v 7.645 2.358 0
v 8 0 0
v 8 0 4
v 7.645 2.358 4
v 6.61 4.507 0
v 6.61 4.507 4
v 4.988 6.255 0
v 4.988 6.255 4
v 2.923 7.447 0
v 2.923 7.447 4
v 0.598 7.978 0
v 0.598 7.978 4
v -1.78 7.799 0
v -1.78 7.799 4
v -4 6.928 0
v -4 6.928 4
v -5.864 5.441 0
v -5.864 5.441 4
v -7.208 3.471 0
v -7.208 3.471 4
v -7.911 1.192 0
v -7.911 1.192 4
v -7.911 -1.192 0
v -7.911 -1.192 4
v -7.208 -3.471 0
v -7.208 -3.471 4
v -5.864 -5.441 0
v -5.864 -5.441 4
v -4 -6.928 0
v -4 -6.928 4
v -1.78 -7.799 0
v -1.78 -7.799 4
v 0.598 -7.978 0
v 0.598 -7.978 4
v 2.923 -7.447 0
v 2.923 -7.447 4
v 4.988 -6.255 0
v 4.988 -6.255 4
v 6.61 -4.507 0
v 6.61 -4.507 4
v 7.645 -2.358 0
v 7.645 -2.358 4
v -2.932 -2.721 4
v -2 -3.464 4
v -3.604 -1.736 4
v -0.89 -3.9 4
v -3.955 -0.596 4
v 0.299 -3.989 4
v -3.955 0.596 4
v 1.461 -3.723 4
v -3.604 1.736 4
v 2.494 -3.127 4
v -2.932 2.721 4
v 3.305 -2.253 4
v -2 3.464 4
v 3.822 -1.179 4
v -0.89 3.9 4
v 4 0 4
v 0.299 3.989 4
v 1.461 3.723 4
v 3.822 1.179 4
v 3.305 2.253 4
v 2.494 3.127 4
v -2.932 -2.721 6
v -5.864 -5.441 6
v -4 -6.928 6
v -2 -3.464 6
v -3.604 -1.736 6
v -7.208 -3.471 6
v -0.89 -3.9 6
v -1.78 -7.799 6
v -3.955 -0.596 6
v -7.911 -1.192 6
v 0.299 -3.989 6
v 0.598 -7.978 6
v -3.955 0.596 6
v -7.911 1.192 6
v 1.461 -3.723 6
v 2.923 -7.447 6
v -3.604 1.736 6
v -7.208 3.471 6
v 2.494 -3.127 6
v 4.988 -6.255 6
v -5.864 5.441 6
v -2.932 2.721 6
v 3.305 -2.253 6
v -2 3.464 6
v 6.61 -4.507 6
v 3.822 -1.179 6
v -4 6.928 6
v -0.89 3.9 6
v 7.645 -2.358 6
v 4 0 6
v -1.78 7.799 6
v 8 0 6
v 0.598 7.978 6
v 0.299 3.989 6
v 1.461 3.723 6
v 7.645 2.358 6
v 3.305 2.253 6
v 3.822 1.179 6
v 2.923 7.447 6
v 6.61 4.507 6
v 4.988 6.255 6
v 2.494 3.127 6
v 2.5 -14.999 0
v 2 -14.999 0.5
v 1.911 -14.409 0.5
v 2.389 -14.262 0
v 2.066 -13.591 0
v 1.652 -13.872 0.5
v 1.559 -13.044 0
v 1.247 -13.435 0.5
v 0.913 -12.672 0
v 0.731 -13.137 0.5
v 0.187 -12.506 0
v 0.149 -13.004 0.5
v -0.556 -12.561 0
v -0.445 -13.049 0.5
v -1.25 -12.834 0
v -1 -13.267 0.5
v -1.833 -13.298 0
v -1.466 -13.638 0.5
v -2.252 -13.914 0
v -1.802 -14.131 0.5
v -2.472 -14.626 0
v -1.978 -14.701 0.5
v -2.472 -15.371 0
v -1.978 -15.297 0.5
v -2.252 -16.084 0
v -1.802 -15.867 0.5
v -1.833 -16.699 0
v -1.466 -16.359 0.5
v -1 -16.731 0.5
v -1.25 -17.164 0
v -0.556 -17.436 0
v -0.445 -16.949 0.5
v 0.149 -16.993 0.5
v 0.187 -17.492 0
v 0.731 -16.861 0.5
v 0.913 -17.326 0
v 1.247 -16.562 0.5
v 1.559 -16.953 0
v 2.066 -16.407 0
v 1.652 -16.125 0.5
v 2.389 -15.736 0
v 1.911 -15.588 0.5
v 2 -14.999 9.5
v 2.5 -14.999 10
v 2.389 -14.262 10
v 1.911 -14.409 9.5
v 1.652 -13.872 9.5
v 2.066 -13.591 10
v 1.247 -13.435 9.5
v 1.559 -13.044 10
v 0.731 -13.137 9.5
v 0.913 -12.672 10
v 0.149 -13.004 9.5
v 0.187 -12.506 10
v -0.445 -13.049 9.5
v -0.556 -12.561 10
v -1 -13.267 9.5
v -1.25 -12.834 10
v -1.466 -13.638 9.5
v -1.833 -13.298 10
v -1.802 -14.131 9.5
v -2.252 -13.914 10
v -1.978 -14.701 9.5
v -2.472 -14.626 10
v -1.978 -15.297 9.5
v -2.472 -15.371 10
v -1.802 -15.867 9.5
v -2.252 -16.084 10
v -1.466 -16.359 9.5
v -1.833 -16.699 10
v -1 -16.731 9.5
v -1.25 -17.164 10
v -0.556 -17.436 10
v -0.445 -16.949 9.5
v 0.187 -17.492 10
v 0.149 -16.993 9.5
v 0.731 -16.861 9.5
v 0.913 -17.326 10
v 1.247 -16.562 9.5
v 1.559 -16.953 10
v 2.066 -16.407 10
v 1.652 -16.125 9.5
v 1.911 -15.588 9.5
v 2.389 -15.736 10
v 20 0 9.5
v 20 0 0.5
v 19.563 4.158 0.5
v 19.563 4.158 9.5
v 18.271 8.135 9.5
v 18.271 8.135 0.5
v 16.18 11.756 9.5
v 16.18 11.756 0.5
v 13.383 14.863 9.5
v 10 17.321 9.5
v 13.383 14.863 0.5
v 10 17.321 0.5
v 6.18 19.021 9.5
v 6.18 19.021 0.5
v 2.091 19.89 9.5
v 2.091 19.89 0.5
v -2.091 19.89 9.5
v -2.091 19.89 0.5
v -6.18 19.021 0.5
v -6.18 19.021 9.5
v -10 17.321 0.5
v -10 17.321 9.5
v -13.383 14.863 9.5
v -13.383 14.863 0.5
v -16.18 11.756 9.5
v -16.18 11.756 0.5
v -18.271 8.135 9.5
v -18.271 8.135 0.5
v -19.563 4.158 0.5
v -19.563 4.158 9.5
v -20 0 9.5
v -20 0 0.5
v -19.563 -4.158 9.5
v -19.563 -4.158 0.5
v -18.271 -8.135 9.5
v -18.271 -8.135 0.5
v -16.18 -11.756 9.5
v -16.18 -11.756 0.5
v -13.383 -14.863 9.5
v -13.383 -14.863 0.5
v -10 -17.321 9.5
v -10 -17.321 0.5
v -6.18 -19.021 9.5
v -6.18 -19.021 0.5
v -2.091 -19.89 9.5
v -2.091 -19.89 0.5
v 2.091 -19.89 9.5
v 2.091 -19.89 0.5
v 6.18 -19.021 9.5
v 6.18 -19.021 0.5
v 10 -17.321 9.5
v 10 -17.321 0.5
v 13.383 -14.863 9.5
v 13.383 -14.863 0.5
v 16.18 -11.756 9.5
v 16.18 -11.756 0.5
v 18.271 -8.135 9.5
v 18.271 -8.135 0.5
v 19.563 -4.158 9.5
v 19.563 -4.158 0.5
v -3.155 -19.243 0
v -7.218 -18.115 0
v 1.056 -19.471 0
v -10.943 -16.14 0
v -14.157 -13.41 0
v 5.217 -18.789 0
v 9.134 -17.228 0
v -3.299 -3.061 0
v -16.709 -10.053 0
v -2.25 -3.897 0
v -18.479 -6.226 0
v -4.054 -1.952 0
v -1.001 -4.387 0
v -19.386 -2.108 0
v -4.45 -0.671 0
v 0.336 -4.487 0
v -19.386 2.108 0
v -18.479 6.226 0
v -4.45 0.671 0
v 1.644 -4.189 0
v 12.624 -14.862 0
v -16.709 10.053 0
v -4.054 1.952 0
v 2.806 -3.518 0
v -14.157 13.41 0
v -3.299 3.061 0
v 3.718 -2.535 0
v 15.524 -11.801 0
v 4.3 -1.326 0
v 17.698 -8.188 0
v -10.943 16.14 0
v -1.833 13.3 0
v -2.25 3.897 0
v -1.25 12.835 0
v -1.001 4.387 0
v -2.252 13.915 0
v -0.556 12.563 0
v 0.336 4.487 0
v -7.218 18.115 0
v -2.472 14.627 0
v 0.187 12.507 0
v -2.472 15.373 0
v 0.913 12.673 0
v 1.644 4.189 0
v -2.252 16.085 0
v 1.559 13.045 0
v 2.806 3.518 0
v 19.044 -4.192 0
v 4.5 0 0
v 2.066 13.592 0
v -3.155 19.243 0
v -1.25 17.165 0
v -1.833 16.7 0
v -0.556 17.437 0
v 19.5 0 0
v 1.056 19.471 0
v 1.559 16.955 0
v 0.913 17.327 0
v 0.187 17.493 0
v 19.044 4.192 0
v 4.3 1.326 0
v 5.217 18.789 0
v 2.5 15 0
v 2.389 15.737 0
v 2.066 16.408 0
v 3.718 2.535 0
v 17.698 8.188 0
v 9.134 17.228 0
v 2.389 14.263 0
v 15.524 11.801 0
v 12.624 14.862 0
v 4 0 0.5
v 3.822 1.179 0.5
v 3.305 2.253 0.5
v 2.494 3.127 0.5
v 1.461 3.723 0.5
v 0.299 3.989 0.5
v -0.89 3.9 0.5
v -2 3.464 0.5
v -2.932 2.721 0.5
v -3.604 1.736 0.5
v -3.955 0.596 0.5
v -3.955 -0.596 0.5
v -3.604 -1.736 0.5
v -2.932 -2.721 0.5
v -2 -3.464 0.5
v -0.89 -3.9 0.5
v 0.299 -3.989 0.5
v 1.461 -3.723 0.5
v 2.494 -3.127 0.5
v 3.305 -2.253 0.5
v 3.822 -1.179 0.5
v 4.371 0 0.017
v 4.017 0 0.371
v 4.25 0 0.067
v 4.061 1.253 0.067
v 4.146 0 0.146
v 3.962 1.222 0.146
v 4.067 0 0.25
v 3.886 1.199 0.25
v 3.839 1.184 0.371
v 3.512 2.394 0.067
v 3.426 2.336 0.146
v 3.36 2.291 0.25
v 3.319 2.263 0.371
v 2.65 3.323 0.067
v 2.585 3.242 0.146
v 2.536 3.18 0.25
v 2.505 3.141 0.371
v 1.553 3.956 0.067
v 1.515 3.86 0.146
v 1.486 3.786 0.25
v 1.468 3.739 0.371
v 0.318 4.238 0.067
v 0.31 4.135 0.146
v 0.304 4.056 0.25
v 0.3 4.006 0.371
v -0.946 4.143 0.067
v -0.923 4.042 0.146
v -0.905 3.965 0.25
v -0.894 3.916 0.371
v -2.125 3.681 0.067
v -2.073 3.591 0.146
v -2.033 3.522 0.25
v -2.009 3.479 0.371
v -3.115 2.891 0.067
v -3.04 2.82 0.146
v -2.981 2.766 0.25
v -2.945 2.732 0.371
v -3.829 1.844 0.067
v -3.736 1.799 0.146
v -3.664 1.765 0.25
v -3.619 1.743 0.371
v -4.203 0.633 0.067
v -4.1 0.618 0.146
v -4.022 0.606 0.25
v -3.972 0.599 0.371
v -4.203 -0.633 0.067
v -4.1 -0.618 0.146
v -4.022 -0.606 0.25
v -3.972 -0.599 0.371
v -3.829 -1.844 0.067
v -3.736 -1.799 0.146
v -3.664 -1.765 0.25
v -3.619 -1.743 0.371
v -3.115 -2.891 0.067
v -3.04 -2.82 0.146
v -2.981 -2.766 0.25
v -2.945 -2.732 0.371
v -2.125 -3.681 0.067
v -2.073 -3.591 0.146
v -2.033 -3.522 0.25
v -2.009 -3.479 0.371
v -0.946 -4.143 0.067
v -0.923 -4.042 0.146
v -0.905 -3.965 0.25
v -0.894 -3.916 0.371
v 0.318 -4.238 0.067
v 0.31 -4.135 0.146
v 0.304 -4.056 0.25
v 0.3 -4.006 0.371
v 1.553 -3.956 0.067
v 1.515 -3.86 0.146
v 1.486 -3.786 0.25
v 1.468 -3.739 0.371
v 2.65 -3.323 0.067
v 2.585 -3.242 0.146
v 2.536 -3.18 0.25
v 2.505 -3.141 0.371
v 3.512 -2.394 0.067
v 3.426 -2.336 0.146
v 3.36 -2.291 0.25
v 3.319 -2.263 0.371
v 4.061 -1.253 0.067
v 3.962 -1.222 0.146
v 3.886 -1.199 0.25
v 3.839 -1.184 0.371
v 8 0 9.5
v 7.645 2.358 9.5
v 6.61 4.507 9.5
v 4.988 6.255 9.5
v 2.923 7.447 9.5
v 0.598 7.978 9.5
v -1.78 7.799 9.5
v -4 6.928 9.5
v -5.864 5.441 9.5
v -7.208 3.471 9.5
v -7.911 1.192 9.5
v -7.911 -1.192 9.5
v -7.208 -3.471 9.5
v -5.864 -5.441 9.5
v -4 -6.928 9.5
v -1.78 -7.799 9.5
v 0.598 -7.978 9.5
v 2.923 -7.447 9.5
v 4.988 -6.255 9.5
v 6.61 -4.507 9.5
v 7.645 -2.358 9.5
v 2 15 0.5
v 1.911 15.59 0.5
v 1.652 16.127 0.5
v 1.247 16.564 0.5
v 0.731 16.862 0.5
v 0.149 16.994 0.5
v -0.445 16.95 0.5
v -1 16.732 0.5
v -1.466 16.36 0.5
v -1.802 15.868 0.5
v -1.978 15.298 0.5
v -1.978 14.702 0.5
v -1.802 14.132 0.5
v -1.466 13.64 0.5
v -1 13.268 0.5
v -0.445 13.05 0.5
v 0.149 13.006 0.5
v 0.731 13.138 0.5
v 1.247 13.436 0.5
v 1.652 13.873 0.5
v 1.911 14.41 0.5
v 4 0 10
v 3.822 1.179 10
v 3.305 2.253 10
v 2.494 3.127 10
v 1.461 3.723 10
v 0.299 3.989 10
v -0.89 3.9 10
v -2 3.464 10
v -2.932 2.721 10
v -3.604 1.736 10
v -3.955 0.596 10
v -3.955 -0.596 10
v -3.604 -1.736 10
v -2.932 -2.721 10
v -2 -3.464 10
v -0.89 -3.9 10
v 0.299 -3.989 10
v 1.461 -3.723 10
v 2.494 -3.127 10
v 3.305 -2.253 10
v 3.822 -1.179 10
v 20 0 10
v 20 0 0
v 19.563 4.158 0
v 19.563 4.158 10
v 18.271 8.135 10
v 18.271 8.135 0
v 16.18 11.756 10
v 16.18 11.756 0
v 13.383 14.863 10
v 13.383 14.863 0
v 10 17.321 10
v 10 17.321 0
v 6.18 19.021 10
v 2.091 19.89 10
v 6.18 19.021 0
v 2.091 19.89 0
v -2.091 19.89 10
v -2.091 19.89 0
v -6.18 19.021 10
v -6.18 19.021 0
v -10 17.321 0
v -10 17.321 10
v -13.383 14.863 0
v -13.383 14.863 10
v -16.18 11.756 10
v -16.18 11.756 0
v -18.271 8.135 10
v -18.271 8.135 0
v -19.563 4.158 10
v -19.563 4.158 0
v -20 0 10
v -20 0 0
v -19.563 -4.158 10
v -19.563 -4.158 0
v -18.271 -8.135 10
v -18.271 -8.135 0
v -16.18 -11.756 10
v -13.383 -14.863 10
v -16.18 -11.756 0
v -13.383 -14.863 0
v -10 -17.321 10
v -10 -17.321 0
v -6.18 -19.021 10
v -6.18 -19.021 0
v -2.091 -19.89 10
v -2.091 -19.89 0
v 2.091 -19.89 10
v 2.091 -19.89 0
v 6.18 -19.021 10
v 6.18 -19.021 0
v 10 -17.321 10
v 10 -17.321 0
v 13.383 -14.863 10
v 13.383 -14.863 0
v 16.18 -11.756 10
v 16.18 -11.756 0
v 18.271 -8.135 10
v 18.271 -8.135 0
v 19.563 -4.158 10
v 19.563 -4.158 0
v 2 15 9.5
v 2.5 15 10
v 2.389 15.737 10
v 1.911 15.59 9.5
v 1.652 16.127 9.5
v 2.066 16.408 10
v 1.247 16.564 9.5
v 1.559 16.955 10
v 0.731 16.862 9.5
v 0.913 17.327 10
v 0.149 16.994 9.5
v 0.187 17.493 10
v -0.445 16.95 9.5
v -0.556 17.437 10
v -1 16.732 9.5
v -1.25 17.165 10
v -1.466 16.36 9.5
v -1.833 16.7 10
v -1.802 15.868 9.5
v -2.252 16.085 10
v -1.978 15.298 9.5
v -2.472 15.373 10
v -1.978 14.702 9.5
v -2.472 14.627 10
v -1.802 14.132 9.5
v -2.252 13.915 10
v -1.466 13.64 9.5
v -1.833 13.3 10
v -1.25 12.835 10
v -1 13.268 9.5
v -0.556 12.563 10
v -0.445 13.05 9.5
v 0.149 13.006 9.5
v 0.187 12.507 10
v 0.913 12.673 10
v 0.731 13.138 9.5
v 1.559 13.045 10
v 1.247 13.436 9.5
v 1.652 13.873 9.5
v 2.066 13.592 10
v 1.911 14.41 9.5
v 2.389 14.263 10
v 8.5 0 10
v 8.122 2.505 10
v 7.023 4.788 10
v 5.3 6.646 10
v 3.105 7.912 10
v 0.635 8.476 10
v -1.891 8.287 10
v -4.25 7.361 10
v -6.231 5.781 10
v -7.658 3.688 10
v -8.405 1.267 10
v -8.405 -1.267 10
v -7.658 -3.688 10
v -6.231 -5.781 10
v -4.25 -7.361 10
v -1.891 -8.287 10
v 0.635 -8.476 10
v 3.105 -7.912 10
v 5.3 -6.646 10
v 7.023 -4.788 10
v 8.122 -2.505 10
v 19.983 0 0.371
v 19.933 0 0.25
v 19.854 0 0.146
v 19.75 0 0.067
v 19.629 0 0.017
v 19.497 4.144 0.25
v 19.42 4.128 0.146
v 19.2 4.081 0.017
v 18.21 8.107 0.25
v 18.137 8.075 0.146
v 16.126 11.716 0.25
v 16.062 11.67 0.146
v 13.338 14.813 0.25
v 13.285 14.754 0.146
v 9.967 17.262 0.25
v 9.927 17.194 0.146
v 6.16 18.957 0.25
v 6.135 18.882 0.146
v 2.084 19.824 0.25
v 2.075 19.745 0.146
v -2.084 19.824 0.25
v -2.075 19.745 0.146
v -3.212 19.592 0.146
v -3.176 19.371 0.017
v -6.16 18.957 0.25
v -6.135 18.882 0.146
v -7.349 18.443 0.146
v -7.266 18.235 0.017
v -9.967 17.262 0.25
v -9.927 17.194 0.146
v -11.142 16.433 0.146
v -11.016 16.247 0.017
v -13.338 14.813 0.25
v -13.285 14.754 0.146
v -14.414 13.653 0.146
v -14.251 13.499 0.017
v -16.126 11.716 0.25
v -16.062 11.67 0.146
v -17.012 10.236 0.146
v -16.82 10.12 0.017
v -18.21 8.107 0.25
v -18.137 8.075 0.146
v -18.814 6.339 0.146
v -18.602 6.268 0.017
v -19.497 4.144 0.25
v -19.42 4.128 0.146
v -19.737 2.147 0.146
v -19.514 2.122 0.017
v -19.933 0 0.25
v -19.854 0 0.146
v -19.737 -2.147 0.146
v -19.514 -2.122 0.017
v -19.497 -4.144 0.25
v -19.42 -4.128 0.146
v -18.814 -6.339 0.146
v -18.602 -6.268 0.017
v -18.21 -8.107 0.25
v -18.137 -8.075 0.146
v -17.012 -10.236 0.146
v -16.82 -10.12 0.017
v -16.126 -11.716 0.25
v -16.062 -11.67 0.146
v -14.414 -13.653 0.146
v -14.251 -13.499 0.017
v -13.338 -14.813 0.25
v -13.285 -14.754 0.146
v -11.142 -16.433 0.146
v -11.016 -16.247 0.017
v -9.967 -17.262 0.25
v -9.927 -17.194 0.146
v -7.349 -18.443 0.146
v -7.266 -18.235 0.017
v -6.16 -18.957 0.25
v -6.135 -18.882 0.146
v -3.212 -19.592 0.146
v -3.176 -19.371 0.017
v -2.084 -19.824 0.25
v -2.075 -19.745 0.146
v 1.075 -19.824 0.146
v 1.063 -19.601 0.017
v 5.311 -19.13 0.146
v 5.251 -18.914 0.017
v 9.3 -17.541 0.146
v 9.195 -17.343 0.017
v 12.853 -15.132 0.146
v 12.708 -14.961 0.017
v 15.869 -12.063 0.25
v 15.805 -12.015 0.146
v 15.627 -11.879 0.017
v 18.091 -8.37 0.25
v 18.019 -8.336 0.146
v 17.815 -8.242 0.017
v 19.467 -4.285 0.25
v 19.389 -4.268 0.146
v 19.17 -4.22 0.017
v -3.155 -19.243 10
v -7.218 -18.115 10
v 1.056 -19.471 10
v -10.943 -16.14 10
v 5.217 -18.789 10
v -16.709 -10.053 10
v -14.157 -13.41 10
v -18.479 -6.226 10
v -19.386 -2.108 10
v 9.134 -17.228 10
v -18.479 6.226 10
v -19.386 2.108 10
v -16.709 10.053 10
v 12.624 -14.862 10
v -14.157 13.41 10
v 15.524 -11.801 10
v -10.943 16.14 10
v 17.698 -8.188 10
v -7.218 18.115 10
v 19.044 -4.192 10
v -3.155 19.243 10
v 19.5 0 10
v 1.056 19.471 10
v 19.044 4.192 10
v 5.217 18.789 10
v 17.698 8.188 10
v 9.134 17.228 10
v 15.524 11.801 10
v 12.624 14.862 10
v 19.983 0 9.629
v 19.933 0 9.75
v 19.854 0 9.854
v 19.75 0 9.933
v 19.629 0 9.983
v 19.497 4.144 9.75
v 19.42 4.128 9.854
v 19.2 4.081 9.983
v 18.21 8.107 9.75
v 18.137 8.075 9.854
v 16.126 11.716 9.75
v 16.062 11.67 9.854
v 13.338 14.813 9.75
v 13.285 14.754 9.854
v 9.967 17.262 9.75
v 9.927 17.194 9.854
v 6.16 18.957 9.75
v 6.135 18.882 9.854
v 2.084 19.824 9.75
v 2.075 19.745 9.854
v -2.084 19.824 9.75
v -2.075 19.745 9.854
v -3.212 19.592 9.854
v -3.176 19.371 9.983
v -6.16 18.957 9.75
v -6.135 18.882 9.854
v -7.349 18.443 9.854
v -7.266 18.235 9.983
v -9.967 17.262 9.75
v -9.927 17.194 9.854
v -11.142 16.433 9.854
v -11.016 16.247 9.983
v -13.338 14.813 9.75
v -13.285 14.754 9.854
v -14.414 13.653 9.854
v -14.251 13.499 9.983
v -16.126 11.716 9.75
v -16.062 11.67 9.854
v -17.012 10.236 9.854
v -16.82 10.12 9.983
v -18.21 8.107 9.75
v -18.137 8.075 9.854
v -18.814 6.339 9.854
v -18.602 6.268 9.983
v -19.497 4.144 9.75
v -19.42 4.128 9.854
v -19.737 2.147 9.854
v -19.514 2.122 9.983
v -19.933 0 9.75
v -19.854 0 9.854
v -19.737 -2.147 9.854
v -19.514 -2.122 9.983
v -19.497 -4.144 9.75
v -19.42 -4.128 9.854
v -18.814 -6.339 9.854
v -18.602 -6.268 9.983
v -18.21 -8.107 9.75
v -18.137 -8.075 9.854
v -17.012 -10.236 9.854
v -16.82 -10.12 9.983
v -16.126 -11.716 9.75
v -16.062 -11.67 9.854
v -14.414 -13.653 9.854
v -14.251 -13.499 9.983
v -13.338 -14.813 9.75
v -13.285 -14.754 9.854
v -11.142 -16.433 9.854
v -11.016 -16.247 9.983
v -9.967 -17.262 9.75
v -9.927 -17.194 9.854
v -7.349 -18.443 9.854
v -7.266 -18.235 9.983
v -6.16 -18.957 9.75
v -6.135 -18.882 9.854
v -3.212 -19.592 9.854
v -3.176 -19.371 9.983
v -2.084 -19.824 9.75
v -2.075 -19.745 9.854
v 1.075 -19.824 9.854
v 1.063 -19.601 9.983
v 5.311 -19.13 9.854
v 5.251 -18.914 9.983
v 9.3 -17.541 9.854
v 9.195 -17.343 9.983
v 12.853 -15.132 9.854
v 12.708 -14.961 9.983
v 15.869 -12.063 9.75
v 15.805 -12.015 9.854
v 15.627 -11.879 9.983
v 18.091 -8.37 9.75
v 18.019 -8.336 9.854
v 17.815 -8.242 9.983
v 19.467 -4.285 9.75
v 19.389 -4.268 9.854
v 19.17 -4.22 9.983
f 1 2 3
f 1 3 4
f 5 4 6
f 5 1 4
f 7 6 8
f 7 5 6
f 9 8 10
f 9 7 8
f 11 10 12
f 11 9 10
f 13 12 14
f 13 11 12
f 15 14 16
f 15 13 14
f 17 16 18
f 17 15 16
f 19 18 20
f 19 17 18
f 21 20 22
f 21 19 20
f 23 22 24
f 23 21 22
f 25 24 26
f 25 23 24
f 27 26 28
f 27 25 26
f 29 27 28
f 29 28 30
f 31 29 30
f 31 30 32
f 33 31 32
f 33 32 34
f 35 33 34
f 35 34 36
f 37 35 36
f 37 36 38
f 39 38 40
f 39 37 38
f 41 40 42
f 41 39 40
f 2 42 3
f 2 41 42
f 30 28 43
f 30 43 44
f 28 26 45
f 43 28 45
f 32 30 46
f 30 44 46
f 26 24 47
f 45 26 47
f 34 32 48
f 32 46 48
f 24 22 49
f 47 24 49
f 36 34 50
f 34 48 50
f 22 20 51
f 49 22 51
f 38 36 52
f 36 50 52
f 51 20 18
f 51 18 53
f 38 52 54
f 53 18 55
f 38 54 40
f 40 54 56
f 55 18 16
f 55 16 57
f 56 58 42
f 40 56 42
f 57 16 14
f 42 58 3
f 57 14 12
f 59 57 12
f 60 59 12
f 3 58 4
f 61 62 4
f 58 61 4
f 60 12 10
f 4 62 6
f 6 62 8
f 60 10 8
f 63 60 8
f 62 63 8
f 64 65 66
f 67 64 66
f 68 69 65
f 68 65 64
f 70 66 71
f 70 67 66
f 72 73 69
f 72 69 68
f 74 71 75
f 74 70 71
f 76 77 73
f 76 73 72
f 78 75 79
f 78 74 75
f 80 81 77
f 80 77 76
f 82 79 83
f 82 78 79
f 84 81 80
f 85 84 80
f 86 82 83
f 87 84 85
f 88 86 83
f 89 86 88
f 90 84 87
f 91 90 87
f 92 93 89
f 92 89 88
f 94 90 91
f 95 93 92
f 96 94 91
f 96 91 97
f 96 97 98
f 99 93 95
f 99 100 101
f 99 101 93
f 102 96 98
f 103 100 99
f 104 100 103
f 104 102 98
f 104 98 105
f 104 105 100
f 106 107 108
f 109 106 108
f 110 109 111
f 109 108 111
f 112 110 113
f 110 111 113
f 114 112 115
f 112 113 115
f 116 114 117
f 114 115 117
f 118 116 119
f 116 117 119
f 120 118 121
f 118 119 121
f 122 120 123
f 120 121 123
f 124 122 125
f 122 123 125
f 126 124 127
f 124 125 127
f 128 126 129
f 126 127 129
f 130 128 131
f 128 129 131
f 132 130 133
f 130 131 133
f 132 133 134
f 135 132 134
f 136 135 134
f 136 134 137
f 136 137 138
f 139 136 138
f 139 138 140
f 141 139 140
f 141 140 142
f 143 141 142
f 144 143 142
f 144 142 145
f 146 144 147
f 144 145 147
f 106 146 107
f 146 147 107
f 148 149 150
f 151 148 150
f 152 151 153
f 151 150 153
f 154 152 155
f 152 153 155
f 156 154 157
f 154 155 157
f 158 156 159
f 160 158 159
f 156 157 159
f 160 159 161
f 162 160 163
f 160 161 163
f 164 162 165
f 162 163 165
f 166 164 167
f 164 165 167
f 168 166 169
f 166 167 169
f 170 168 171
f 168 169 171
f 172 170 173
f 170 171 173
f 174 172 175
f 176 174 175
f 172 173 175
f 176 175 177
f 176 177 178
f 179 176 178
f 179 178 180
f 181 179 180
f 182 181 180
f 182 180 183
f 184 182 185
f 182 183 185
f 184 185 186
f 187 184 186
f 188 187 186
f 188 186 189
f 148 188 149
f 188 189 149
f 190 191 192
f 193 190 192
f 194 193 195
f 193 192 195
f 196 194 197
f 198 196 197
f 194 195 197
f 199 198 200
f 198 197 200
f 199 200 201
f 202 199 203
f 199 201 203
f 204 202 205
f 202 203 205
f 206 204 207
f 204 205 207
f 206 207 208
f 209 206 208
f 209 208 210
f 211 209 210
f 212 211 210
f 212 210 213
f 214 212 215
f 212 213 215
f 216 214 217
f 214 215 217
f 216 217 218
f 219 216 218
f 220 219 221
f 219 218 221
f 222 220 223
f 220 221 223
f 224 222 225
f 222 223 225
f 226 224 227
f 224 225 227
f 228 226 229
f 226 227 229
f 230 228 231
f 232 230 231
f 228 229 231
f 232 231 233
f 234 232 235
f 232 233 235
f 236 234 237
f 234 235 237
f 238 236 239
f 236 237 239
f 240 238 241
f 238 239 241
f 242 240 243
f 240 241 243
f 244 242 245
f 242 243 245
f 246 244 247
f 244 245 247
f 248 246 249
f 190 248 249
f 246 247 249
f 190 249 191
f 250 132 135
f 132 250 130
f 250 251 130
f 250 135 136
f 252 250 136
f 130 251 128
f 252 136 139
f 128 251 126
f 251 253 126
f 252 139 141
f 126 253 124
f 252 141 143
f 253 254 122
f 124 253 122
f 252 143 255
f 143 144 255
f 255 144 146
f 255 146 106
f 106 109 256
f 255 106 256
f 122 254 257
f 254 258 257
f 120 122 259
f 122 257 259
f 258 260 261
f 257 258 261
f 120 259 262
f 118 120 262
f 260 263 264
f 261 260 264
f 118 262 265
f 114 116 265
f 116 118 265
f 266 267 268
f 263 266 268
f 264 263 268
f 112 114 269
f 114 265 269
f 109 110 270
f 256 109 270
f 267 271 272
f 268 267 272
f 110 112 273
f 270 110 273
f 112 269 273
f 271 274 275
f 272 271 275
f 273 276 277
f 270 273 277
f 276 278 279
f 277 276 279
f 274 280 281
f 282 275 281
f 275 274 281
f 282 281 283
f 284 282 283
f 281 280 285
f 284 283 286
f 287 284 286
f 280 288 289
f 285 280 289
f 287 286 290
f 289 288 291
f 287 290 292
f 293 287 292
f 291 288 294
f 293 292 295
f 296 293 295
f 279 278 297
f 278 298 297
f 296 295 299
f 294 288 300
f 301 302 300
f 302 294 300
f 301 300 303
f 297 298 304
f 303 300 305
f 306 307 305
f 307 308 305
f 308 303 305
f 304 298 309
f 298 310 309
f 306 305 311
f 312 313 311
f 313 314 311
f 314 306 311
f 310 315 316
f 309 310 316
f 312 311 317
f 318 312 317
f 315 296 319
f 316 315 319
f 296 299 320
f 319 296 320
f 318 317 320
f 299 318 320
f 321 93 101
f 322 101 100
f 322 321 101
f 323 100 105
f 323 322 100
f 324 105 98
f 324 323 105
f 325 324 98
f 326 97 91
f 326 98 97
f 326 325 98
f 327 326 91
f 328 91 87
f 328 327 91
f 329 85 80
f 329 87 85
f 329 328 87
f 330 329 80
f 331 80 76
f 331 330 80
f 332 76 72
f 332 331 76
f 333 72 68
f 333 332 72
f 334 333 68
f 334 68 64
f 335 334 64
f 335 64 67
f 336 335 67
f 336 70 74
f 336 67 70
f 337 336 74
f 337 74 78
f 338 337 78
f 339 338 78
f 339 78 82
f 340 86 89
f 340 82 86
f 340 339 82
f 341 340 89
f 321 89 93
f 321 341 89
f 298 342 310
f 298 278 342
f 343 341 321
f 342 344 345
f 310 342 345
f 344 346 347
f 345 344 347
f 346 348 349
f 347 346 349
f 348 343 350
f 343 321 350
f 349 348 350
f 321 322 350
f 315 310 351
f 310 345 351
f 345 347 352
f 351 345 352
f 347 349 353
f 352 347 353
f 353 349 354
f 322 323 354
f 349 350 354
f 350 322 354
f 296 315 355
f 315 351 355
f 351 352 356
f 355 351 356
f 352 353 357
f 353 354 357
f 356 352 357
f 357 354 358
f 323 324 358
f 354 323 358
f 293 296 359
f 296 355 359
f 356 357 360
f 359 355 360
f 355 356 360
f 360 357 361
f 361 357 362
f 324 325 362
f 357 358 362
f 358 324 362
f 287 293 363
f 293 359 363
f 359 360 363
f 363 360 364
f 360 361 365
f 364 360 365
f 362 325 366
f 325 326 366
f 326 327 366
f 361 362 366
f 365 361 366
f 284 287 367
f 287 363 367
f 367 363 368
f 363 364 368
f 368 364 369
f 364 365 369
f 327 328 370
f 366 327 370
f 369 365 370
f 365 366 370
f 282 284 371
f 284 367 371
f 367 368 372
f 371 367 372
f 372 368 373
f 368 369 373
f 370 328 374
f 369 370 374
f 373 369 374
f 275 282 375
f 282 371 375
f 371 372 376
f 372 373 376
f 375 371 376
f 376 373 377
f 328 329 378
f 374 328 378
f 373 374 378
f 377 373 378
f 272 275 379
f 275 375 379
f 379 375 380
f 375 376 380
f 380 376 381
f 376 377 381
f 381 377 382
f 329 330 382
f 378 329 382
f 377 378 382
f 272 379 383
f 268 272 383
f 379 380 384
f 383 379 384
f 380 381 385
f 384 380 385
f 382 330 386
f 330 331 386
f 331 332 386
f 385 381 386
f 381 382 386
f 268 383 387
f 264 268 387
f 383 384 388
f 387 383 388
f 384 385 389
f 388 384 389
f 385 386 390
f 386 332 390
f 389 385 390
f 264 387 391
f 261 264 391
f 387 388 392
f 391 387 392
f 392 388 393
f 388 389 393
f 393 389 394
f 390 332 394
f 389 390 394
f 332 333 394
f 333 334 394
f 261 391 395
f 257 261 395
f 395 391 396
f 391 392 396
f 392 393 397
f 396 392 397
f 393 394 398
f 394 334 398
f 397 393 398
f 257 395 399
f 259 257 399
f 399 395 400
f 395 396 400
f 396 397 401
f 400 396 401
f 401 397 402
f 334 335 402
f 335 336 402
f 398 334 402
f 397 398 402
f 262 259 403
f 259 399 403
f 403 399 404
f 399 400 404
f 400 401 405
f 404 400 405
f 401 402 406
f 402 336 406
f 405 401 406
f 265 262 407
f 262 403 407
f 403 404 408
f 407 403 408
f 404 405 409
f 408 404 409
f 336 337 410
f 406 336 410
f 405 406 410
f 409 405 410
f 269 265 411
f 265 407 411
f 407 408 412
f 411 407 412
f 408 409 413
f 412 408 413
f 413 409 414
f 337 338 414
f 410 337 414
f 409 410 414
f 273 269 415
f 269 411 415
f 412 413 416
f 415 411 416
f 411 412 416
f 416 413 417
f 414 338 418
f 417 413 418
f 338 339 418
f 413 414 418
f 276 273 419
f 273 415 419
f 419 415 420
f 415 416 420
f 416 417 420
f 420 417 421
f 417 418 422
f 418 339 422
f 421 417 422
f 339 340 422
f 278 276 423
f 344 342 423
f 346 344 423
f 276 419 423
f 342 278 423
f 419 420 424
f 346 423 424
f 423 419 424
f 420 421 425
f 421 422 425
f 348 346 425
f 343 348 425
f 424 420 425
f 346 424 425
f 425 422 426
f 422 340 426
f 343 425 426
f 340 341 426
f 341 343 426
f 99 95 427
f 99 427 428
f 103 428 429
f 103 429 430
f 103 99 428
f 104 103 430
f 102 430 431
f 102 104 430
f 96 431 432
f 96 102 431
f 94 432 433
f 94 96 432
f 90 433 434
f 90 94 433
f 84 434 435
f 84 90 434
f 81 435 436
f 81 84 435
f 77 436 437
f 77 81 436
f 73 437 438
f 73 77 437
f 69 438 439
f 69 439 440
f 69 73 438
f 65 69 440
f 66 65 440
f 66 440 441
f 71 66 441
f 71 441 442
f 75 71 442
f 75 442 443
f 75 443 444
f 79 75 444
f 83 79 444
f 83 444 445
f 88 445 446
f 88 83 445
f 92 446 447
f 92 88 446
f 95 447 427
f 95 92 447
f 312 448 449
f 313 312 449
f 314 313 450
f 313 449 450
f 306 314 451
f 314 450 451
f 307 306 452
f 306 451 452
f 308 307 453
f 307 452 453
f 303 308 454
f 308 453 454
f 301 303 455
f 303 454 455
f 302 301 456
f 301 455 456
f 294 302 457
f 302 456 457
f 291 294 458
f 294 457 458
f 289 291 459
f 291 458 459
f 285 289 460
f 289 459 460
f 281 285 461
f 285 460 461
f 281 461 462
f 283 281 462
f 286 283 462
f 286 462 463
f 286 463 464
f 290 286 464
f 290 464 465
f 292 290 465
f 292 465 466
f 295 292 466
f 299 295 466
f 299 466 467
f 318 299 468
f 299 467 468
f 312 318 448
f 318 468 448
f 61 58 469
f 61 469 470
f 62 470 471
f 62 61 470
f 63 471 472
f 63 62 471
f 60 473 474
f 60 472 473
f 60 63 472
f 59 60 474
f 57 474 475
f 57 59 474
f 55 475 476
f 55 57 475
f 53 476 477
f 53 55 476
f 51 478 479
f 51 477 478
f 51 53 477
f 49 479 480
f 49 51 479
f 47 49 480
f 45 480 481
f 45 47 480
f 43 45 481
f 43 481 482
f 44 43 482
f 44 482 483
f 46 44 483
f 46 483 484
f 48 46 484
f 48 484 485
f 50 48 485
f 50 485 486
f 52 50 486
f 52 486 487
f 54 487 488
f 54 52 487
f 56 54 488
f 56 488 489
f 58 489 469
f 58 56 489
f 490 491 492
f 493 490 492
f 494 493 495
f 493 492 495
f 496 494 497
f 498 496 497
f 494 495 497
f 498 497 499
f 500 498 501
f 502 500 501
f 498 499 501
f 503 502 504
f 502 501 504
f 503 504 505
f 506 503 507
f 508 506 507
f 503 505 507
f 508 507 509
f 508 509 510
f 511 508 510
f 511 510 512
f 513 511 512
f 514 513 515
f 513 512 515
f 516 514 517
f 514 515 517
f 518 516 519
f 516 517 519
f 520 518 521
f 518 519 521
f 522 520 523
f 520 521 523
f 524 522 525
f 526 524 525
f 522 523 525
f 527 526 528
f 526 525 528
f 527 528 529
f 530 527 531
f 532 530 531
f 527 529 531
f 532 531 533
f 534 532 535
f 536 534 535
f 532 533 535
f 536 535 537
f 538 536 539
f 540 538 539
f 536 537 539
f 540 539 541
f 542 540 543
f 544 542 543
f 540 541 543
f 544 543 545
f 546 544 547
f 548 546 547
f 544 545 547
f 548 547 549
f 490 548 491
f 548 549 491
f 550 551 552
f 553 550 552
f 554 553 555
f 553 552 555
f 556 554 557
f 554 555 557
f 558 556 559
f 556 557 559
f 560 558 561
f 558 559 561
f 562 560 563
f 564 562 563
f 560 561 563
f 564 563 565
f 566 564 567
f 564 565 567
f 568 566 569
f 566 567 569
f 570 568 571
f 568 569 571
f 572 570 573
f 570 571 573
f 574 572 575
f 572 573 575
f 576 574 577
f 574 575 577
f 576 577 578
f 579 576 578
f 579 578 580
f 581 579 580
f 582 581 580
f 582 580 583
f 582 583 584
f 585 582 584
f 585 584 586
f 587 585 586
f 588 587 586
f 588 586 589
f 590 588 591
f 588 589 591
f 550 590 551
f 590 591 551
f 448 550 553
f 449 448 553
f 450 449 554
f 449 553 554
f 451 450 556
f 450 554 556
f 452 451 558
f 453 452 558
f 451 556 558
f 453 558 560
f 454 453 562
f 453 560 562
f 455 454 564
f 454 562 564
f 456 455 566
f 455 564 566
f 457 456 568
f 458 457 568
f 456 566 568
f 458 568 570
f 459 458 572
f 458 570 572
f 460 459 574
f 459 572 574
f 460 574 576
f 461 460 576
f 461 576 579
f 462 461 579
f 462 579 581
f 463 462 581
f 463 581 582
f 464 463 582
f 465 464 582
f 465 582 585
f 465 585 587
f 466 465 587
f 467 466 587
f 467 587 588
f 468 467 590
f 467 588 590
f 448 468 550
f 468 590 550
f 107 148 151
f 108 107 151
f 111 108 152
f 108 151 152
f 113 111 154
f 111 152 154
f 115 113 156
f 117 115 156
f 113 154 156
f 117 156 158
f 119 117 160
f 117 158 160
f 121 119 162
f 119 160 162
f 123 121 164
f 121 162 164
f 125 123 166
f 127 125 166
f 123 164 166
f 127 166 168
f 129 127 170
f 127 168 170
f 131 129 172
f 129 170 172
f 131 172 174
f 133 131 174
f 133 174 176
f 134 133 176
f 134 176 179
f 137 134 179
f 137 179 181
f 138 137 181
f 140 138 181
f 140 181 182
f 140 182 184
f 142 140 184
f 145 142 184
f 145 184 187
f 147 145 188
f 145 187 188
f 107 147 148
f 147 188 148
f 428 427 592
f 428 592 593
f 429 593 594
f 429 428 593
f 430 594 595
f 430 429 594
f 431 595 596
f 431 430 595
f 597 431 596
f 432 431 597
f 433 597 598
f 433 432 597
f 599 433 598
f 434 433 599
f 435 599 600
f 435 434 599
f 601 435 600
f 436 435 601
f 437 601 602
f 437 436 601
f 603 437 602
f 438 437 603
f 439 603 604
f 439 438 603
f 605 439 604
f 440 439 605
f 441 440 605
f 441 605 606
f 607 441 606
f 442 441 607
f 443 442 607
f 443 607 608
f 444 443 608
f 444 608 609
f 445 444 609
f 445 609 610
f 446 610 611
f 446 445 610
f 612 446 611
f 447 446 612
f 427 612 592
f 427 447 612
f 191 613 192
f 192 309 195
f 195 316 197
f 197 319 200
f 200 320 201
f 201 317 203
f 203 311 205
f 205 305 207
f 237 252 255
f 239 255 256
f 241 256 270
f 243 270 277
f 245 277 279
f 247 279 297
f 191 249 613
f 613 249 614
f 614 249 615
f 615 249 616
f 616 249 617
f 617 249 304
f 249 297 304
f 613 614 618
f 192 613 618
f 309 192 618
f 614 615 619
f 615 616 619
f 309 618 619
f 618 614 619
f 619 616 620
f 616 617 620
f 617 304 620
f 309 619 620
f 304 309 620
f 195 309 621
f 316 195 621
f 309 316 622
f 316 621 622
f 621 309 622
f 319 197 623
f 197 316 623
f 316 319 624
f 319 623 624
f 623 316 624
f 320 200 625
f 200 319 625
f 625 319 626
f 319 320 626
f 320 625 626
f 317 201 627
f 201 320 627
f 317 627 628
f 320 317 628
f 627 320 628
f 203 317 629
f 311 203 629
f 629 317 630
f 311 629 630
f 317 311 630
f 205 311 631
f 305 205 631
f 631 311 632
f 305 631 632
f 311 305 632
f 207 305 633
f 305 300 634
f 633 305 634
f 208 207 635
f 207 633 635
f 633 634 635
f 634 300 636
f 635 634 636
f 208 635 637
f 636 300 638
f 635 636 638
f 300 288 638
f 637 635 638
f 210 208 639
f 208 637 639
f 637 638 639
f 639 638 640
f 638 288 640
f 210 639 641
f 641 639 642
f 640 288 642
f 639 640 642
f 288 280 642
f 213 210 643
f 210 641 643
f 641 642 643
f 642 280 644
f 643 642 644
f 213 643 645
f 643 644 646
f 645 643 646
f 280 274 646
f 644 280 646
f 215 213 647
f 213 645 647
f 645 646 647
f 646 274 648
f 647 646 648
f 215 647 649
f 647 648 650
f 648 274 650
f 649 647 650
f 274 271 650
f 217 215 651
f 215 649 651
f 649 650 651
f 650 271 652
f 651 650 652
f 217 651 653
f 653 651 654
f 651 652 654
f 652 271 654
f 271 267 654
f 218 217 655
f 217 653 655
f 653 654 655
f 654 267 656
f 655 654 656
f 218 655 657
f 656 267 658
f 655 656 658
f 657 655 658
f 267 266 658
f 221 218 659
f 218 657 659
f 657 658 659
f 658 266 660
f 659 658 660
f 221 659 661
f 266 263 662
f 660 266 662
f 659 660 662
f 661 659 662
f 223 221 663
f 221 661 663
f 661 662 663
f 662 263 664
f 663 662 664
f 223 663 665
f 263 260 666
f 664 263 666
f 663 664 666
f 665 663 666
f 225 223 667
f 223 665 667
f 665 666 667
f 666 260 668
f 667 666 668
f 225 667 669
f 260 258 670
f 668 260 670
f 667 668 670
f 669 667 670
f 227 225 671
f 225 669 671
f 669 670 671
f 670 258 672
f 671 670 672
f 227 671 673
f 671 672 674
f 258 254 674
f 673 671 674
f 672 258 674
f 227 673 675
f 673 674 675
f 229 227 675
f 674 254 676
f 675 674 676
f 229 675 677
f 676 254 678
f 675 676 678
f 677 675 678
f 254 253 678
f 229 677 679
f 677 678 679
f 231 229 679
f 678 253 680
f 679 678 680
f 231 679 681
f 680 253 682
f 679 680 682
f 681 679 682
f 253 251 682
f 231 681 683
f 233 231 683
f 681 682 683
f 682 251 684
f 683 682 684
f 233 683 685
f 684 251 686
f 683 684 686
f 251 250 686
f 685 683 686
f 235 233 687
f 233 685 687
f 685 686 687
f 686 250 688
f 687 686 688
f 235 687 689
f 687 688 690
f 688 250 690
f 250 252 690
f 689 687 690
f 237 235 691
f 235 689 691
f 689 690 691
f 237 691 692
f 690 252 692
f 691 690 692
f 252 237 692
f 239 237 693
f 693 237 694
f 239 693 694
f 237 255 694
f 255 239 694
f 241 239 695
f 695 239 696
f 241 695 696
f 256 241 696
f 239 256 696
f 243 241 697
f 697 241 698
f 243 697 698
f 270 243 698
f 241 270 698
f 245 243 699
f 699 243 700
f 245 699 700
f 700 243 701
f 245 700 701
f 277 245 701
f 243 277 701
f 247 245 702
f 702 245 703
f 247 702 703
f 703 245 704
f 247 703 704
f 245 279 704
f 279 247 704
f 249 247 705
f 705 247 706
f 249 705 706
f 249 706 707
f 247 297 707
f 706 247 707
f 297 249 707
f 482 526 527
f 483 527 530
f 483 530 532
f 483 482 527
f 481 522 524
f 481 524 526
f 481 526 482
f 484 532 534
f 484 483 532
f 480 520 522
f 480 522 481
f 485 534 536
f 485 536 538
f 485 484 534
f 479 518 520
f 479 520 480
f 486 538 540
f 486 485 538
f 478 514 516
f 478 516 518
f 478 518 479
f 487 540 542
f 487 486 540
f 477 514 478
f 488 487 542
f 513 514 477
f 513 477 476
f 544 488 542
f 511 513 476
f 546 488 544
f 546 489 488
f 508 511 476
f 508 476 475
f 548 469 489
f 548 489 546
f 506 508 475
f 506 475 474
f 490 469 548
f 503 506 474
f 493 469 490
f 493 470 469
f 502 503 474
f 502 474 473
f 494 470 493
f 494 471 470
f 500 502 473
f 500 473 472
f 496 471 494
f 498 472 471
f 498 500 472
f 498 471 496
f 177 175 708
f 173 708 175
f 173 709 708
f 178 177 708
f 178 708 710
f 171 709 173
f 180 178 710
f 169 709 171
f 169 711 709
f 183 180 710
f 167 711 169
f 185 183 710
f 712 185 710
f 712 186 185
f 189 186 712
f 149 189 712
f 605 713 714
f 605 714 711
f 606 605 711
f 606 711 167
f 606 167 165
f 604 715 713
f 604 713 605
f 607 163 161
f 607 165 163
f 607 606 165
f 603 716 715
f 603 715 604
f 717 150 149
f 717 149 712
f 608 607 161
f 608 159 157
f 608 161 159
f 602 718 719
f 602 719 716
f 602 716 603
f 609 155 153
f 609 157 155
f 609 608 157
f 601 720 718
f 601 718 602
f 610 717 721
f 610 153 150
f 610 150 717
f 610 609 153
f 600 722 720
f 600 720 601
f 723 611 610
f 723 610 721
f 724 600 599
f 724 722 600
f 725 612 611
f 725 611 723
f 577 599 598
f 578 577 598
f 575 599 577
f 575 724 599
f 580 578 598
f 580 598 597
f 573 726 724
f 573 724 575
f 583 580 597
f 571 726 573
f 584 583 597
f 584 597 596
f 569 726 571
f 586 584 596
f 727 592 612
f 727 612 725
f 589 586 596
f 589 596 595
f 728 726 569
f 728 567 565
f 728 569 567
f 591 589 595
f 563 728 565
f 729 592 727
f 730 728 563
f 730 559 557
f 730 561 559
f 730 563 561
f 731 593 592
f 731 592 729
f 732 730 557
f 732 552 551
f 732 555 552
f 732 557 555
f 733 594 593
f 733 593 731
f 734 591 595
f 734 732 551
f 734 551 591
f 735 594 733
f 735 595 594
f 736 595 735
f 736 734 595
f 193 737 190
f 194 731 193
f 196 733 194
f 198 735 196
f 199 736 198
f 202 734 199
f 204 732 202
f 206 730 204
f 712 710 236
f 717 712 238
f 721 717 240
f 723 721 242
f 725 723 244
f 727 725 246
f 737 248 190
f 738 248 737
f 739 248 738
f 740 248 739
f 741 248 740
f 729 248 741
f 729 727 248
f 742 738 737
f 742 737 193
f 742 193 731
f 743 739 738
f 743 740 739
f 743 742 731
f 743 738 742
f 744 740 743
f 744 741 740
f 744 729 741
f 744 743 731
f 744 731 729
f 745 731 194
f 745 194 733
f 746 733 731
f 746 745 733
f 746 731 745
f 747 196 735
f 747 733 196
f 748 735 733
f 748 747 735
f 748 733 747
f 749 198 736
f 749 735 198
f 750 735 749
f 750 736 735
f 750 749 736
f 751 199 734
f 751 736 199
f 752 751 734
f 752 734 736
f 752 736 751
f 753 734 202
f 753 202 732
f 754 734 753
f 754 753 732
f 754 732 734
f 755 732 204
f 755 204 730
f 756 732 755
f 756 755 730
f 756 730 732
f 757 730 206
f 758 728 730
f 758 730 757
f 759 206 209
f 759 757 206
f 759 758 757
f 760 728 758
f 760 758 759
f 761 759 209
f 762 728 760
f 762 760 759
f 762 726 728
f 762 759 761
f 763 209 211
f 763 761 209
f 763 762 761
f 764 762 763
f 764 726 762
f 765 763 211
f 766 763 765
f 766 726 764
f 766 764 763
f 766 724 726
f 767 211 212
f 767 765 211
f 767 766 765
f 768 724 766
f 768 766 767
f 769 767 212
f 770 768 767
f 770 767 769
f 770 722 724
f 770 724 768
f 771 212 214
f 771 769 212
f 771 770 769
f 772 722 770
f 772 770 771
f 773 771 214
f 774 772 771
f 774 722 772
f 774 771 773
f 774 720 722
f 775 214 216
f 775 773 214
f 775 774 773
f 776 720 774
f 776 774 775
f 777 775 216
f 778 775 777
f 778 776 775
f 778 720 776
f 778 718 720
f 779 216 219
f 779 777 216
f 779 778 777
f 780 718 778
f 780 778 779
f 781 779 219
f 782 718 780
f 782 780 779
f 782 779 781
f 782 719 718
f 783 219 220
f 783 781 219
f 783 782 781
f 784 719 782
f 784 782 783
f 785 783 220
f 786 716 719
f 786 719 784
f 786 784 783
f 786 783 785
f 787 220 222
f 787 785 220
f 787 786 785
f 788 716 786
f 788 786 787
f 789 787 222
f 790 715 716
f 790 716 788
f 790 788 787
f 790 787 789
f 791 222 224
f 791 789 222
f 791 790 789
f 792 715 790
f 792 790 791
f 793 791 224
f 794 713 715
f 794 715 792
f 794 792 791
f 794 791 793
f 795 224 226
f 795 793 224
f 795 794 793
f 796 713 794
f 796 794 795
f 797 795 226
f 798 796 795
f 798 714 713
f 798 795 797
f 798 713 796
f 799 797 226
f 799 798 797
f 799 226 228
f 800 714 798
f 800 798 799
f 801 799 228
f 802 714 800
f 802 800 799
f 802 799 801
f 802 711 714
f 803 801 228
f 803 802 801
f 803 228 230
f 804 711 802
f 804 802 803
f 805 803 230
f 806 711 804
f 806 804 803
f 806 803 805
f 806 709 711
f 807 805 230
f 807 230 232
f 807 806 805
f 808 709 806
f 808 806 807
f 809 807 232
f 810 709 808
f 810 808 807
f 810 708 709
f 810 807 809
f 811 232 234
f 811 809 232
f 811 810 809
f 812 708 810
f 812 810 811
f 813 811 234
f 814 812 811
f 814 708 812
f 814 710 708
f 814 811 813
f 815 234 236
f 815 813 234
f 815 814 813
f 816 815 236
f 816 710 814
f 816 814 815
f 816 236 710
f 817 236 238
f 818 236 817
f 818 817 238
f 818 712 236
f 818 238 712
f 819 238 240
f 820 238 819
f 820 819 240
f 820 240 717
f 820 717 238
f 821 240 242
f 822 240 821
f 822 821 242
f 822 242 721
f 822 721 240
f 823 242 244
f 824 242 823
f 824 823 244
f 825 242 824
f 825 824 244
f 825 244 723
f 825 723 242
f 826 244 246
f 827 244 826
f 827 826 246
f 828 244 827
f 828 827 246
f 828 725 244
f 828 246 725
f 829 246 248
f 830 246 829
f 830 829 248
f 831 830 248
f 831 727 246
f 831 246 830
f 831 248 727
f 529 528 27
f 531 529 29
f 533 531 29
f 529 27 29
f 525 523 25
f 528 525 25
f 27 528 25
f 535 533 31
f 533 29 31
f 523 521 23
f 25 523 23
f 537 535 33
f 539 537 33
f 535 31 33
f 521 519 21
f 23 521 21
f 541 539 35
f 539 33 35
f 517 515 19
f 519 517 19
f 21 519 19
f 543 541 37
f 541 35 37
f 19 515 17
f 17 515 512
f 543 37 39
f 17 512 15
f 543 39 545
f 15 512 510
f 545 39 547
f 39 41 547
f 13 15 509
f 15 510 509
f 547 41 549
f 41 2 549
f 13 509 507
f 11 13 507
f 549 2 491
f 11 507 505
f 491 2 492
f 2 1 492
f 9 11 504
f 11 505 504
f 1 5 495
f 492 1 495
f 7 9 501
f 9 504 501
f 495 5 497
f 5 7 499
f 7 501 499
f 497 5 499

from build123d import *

# Parameters (mm, degrees)
SKETCH_1_R          = 20
EXTRUDE_1_DEPTH     = 10
SKETCH_2_R          = 4
CUT_EXTRUDE_1_DEPTH = 14
SKETCH_3_R          = 8
CUT_EXTRUDE_2_DEPTH = 4
SKETCH_4_R          = 20
EXTRUDE_2_DEPTH     = 10
CUT_EXTRUDE_START   = -10
SKETCH_5_R          = 4
CUT_EXTRUDE_3_DEPTH = 10
CUT_EXTRUDE_START_2 = -4
SKETCH_6_R          = 8
CUT_EXTRUDE_4_DEPTH = 4
SKETCH_7_R          = 2
CUT_EXTRUDE_5_DEPTH = 10
FILLET_1_R          = 0.5
CHAMFER_1_SIZE      = 0.5
FILLET_2_R          = 0.5
CHAMFER_3_SIZE      = 0.5


with BuildPart() as part:
    # 草图1 → 凸台-拉伸1 (new body)
    with BuildSketch(Plane.XY):
        Circle(SKETCH_1_R)
    extrude(amount=EXTRUDE_1_DEPTH)

    # 草图2 → 切除-拉伸1 (cut)
    with BuildSketch(Plane.XY):
        Circle(SKETCH_2_R)
    extrude(amount=CUT_EXTRUDE_1_DEPTH, mode=Mode.SUBTRACT)

    # 草图3 → 切除-拉伸2 (cut)
    with BuildSketch(Plane.XY):
        Circle(SKETCH_3_R)
    extrude(amount=CUT_EXTRUDE_2_DEPTH, mode=Mode.SUBTRACT)


with BuildPart() as body_2:
    # 草图4 → 凸台-拉伸2 (new body)
    with BuildSketch(Plane.XY):
        Circle(SKETCH_4_R)
    extrude(amount=EXTRUDE_2_DEPTH)

    # 草图5 → 切除-拉伸3 (cut)
    with BuildSketch(Plane.XY.offset(10).offset(CUT_EXTRUDE_START)):
        Circle(SKETCH_5_R)
    extrude(amount=CUT_EXTRUDE_3_DEPTH, mode=Mode.SUBTRACT)

    # 草图6 → 切除-拉伸4 (cut)
    with BuildSketch(Plane.XY.offset(10).offset(CUT_EXTRUDE_START_2)):
        Circle(SKETCH_6_R)
    extrude(amount=CUT_EXTRUDE_4_DEPTH, mode=Mode.SUBTRACT)

    # 草图7 → 切除-拉伸5 (cut)
    with BuildSketch(Plane.XY.offset(10)):
        with Locations((0, -14.998800891)):
            Circle(SKETCH_7_R)
        with Locations((0, 15)):
            Circle(SKETCH_7_R)
    extrude(amount=-CUT_EXTRUDE_5_DEPTH, mode=Mode.SUBTRACT)

    # 圆角1
    fillet_1_edges = [body_2.edges().sort_by_distance(p)[0] for p in [
        (-20, 0, 0),
        (-20, 0, 10),
    ]]
    fillet(fillet_1_edges, radius=FILLET_1_R)

    # 倒角1
    chamfer_1_edges = [body_2.edges().sort_by_distance(p)[0] for p in [
        (-8, 0, 10),
    ]]
    chamfer(chamfer_1_edges, length=CHAMFER_1_SIZE)

    # 圆角2
    fillet_2_edges = [body_2.edges().sort_by_distance(p)[0] for p in [
        (-4, 0, 0),
    ]]
    fillet(fillet_2_edges, radius=FILLET_2_R)

    # 倒角3
    chamfer_3_edges = [body_2.edges().sort_by_distance(p)[0] for p in [
        (-2, -14.998800891, 0),
        (-2, -14.998800891, 10),
        (-2, 15, 0),
        (-2, 15, 10),
    ]]
    chamfer(chamfer_3_edges, length=CHAMFER_3_SIZE)


solid = Compound([part.part, body_2.part])
